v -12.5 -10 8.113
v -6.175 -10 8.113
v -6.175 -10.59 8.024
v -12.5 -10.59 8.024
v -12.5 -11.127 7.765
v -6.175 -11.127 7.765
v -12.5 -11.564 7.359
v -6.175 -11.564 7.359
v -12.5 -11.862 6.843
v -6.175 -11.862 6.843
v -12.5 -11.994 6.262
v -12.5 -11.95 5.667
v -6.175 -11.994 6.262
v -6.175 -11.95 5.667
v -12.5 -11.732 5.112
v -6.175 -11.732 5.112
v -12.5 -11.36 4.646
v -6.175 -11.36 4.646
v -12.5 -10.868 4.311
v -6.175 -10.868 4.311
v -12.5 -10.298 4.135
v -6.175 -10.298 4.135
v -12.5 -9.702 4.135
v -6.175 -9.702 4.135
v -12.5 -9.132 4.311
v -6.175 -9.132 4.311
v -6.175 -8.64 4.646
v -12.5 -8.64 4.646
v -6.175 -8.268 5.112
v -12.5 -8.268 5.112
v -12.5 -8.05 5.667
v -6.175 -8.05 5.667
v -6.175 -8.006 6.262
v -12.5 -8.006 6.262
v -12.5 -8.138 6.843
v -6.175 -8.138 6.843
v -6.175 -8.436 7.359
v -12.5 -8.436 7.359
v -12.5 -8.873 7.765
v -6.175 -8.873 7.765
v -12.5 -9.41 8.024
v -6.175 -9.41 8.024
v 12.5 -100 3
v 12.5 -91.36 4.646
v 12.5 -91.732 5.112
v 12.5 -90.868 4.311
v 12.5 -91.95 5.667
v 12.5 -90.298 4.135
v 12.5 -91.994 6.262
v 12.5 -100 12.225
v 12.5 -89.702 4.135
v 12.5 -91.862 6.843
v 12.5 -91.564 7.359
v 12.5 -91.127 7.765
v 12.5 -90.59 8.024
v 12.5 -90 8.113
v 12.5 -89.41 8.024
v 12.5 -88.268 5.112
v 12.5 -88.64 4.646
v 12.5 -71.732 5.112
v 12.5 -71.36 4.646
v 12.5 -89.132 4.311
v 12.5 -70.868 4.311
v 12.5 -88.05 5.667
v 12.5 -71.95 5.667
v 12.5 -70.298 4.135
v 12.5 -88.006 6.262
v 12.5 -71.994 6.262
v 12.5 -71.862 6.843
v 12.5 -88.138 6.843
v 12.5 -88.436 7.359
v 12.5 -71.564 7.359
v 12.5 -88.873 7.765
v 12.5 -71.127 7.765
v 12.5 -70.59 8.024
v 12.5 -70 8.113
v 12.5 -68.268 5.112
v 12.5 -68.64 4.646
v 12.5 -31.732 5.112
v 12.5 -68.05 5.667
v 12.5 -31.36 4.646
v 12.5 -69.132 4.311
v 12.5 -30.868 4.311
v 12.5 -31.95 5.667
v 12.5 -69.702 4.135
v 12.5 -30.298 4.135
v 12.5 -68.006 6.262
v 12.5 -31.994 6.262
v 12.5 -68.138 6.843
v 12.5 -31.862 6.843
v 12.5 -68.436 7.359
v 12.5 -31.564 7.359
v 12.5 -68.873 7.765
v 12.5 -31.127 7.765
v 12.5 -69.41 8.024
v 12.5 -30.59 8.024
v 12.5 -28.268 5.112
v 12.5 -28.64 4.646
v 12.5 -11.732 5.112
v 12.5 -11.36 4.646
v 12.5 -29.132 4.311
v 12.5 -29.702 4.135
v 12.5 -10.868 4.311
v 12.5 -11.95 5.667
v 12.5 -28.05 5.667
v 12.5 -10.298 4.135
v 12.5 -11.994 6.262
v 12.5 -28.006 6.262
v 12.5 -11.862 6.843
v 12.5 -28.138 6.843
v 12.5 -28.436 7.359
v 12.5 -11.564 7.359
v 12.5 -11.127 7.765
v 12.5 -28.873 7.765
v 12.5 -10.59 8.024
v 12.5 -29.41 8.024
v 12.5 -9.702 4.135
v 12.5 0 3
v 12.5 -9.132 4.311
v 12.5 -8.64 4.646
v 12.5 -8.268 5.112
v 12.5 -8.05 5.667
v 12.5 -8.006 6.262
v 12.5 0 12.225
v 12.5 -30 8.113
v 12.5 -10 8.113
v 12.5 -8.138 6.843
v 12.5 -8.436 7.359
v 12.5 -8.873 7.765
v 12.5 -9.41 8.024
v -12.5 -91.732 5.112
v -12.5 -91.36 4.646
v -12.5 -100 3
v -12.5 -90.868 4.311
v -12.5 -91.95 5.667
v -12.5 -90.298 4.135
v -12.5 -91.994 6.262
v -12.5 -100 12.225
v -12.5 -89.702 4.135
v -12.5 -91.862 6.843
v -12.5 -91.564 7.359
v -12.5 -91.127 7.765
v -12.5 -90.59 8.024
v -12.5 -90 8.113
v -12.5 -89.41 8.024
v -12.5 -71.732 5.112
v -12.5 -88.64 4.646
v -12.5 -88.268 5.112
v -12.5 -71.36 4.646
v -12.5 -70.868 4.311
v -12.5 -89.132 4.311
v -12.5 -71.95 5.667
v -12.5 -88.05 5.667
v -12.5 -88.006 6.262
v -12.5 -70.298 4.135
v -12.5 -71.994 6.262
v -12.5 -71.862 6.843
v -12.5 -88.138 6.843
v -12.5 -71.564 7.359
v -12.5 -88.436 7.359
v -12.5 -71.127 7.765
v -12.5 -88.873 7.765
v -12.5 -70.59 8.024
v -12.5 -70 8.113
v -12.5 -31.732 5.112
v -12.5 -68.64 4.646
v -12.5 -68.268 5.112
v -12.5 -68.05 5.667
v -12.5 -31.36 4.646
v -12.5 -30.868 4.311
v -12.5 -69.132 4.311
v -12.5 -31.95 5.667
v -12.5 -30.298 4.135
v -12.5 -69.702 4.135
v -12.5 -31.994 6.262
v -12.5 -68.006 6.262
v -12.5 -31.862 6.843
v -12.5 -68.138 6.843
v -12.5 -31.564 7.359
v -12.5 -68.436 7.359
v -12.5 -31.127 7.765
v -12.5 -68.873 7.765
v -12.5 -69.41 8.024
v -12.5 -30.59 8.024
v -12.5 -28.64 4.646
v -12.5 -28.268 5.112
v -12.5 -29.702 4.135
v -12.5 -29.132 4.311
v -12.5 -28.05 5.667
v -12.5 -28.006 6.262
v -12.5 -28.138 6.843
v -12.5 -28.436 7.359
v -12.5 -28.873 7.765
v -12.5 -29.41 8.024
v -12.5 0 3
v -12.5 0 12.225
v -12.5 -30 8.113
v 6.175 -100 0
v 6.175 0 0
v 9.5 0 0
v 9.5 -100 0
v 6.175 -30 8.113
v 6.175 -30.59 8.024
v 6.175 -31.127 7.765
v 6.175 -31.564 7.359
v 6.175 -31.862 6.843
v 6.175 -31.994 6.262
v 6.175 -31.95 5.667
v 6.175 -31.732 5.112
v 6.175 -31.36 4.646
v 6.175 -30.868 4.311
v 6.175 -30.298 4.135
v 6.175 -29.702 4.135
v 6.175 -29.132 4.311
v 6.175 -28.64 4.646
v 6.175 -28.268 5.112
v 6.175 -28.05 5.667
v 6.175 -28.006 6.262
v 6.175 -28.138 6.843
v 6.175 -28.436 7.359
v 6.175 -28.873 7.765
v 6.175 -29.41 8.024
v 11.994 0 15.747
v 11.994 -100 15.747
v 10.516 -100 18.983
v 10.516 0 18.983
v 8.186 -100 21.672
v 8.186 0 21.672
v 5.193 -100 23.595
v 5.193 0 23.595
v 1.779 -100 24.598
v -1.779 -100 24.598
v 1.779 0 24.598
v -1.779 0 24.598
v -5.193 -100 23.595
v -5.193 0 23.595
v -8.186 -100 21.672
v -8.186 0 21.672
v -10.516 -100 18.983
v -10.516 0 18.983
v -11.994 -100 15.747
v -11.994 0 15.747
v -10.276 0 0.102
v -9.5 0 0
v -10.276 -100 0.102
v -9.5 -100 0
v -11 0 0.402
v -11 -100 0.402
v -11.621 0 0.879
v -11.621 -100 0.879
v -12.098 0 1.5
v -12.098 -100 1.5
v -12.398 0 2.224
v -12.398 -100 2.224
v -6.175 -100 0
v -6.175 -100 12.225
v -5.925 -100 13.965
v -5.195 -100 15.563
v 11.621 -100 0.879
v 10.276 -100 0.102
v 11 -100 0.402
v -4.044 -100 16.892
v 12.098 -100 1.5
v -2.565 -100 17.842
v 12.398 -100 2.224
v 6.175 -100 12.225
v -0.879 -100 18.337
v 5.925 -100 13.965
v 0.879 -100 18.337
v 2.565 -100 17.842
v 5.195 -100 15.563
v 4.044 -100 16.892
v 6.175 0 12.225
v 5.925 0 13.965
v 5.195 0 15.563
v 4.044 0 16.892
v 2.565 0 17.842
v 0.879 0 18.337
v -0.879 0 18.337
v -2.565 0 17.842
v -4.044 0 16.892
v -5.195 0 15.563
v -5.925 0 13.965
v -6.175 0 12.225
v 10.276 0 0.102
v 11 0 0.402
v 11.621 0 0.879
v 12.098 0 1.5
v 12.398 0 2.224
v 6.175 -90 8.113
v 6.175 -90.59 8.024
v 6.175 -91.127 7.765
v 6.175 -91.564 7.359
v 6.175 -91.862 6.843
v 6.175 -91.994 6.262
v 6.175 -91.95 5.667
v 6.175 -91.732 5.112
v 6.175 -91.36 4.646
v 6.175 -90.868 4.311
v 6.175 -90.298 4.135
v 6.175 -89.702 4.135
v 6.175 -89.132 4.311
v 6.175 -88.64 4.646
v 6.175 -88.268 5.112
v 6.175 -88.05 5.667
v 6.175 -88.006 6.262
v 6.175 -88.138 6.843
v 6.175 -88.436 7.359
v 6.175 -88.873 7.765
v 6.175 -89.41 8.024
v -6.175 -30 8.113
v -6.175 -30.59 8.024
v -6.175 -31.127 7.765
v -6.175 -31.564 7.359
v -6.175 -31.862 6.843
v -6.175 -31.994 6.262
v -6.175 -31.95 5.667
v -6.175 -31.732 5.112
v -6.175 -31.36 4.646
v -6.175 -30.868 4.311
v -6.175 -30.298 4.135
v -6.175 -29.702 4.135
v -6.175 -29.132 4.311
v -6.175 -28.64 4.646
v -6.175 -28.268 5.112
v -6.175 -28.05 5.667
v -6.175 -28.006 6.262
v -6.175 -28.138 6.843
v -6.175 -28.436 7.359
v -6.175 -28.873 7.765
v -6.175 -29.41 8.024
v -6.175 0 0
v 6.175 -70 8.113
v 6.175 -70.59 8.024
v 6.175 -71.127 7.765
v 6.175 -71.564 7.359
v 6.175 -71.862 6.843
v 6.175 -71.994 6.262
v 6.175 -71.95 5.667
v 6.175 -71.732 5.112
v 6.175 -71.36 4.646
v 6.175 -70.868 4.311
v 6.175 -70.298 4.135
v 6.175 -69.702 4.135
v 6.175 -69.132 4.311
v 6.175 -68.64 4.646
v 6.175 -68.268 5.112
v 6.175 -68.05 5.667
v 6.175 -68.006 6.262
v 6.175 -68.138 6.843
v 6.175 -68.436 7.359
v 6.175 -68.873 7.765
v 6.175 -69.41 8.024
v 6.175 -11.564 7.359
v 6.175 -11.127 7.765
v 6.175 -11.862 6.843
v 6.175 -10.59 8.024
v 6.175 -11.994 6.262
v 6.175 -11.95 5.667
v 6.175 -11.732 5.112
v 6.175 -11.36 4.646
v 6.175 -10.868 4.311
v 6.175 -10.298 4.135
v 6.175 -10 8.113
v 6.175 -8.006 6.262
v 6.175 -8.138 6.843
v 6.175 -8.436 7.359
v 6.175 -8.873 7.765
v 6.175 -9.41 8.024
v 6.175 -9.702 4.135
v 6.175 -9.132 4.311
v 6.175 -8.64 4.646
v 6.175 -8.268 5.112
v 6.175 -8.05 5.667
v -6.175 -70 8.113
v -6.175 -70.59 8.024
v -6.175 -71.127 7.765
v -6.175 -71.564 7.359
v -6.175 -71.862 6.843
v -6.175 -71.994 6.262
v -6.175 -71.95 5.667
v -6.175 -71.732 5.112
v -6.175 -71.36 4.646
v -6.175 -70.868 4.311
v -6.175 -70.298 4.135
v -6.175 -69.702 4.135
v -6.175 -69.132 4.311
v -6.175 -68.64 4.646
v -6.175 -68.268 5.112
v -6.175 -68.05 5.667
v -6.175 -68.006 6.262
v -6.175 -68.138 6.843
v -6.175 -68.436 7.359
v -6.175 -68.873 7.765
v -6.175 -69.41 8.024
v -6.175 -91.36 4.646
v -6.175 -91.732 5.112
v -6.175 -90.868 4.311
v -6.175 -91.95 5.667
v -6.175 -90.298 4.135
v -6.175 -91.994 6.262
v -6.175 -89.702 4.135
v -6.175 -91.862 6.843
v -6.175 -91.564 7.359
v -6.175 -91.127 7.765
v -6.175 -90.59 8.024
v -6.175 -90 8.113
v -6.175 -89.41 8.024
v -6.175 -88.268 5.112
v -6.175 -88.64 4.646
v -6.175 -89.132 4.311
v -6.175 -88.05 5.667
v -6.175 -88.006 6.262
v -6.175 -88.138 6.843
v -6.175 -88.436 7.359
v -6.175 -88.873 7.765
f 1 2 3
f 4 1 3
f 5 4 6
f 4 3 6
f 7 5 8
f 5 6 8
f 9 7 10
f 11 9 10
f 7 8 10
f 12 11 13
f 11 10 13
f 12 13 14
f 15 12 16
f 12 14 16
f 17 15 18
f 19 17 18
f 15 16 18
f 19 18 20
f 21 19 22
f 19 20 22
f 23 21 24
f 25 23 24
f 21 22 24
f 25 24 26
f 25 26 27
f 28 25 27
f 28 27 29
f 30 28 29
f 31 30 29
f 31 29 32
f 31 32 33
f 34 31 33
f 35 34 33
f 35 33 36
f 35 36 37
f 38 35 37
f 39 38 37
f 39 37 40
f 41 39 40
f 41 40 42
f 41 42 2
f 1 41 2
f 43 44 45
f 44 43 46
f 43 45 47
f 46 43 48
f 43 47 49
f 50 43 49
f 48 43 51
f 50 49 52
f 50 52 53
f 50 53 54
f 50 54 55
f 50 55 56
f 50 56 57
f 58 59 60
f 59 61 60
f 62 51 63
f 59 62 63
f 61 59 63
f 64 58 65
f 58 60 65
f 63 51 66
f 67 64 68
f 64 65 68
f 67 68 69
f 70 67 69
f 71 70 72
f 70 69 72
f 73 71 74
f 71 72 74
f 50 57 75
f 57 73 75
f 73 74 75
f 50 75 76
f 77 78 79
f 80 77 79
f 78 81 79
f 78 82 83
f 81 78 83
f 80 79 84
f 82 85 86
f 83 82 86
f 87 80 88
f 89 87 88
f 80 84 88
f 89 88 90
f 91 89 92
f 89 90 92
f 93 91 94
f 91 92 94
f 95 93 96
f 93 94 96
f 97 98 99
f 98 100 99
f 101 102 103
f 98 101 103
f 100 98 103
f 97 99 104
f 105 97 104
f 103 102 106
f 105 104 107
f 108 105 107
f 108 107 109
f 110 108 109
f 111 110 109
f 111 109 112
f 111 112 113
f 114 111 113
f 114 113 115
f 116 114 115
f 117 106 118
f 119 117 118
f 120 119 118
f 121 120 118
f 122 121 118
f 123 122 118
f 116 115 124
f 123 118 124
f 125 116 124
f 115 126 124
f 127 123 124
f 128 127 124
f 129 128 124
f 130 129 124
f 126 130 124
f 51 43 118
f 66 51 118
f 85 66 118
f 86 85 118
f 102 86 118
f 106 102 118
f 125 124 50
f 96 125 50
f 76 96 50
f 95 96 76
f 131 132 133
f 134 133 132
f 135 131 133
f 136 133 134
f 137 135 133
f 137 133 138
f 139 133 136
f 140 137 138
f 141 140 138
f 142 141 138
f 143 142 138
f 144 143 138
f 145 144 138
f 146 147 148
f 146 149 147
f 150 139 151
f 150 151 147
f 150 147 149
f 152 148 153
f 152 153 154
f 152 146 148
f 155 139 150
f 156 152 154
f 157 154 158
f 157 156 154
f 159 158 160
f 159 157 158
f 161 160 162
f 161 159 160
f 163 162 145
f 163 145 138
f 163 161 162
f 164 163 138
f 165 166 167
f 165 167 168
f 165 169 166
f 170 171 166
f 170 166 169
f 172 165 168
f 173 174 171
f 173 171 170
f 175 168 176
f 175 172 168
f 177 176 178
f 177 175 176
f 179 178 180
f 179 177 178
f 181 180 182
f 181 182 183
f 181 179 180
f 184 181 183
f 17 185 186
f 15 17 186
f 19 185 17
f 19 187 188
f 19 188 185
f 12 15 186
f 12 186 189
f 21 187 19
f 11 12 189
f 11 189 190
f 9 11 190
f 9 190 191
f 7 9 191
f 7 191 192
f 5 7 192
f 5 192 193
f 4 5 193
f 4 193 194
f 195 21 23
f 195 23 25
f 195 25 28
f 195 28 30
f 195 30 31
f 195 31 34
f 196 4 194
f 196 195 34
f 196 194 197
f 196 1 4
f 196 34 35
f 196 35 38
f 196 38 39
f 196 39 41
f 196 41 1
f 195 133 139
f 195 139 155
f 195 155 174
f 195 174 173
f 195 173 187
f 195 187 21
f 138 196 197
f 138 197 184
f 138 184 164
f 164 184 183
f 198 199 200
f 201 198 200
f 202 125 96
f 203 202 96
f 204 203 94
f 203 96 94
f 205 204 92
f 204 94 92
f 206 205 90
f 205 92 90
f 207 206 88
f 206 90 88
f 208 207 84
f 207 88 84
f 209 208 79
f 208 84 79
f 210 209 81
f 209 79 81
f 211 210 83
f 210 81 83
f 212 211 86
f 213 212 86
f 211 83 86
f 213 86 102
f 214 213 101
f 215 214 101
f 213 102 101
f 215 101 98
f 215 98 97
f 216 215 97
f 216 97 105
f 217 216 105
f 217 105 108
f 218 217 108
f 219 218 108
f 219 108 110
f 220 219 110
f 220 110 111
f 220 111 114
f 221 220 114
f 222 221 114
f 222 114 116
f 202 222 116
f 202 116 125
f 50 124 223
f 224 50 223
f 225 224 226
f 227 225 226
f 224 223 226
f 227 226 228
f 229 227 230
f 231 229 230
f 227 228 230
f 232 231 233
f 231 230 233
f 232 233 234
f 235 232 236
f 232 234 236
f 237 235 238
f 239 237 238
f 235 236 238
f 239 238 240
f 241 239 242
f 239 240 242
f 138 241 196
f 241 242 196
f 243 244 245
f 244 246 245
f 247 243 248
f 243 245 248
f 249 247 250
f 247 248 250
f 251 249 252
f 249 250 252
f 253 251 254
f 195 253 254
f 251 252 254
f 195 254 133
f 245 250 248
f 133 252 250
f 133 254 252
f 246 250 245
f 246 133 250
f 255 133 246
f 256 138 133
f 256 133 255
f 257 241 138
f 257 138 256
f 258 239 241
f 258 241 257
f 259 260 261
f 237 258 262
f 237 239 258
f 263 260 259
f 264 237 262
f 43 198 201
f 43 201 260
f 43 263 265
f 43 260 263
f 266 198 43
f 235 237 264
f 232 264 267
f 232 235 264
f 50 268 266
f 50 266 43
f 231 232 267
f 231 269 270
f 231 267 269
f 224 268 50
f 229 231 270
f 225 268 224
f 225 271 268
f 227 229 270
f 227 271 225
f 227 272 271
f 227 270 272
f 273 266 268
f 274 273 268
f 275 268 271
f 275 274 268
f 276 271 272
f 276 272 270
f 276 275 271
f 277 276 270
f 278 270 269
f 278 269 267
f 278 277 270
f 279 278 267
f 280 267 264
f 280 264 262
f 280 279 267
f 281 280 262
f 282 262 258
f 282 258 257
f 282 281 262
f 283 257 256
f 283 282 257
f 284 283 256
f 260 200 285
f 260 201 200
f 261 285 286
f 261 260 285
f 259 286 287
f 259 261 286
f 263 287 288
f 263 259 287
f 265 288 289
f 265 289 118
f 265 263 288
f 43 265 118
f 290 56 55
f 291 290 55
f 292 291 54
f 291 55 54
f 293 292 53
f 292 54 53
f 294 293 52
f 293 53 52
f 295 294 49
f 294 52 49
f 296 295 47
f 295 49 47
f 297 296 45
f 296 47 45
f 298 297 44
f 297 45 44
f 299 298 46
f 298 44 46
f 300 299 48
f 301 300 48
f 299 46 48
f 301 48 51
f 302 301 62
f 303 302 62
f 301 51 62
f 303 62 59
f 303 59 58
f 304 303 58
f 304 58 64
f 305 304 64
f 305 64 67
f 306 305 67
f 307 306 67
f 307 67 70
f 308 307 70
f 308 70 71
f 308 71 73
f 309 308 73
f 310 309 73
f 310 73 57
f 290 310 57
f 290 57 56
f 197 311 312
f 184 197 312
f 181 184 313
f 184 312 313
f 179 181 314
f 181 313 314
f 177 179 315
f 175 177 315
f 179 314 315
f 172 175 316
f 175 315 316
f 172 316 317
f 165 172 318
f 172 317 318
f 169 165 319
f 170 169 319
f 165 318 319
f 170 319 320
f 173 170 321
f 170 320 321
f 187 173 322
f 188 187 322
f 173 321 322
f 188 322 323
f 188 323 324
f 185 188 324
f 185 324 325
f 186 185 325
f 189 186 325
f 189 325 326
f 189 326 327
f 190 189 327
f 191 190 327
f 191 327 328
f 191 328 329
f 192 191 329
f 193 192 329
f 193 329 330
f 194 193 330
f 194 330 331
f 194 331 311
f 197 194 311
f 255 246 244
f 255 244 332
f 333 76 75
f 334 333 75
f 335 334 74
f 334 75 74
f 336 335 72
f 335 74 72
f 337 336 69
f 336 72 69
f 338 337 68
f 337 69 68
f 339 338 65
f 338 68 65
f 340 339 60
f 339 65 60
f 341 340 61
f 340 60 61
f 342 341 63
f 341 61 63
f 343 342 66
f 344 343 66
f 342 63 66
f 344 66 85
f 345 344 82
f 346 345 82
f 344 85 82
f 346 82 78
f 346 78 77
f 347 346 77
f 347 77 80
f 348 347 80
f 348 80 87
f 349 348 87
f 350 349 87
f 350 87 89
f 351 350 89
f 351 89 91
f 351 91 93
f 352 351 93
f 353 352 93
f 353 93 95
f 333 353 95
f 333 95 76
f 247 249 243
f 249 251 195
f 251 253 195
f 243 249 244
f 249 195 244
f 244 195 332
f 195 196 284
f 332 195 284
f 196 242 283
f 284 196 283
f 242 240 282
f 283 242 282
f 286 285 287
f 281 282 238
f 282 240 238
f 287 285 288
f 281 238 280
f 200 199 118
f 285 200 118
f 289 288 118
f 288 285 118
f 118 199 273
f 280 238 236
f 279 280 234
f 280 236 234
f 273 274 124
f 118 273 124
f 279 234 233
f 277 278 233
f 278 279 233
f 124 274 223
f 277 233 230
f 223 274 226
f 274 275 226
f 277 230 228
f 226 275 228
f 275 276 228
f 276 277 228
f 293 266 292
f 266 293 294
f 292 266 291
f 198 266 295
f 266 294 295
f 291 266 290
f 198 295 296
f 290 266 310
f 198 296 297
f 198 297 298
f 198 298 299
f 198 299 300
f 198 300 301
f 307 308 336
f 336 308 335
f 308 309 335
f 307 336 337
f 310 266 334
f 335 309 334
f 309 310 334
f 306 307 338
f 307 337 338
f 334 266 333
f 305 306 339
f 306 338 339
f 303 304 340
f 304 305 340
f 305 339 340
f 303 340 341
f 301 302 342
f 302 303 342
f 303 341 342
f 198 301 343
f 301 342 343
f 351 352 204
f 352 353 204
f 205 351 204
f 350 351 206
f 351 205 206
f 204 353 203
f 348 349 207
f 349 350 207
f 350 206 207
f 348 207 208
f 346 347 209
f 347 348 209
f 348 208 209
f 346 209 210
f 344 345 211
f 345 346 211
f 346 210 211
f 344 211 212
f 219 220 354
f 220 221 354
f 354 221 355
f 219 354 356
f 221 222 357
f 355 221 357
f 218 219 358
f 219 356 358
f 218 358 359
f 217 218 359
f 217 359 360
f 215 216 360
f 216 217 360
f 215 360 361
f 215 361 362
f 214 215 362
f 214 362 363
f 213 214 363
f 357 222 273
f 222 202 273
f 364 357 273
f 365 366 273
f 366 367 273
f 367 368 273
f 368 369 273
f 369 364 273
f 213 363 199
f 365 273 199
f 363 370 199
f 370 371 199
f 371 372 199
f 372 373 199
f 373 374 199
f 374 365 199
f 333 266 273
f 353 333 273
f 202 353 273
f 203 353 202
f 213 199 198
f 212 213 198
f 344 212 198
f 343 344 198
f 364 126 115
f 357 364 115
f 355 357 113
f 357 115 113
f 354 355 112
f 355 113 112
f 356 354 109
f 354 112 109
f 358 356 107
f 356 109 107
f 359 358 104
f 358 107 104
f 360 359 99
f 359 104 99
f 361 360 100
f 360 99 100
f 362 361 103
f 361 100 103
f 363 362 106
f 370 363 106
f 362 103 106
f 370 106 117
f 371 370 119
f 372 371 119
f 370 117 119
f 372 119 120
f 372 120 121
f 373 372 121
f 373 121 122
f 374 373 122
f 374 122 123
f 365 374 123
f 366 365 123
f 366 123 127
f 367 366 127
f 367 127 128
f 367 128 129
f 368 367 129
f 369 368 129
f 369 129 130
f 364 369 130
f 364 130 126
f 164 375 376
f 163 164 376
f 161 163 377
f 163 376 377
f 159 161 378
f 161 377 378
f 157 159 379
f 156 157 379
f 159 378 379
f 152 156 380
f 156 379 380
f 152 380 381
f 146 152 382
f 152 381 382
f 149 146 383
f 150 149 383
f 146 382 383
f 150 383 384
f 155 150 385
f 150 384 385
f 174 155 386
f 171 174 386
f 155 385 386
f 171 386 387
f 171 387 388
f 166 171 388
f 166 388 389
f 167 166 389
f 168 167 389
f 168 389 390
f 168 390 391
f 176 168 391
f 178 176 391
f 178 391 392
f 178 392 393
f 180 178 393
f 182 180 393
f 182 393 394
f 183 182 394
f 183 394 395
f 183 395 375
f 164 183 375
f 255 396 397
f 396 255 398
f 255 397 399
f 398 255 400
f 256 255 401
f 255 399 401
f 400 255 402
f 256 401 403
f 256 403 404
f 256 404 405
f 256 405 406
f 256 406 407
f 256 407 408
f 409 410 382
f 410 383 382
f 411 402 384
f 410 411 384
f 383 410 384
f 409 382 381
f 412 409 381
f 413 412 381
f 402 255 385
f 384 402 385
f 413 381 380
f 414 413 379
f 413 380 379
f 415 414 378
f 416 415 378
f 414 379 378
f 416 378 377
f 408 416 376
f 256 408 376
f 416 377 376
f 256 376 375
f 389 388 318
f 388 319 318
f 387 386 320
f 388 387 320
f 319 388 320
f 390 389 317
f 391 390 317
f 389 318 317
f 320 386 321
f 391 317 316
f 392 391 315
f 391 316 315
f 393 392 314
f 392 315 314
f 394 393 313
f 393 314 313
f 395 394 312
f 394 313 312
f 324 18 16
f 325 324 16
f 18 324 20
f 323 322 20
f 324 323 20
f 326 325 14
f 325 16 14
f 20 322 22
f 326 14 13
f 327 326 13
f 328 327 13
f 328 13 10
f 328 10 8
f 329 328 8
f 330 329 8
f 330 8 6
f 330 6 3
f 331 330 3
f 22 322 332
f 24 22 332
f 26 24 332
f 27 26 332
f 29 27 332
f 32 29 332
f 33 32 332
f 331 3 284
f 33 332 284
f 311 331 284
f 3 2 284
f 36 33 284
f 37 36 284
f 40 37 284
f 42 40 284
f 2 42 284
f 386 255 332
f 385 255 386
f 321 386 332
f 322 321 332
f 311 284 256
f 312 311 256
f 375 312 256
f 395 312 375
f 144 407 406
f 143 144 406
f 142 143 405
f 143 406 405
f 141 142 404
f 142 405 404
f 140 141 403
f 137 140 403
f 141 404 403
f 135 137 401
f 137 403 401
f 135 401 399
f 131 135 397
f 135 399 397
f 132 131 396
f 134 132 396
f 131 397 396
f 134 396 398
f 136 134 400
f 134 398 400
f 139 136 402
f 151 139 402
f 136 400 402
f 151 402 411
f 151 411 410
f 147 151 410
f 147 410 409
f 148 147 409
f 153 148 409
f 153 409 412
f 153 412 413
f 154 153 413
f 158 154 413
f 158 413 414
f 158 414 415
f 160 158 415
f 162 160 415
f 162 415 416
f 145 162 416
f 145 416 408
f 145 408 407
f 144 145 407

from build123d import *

# Parameters (mm, degrees)
PAD_DEPTH    = 100
SKETCH001_R  = 2
POCKET_DEPTH = 25.001
FILLET_R     = 3


with BuildPart() as part:
    # Sketch → Pad (new body)
    with BuildSketch(Plane.XZ):
        with BuildLine():
            Line((-6.175, 0), (-6.175, 12.225))
            ThreePointArc((6.175, 12.225), (0, 18.4), (-6.175, 12.225))
            Line((6.175, 12.225), (6.175, 0))
            Line((6.175, 0), (12.5, 0))
            Line((12.5, 0), (12.5, 12.225))
            ThreePointArc((12.5, 12.225), (0, 24.725), (-12.5, 12.225))
            Line((-12.5, 0), (-12.5, 12.225))
            Line((-12.5, 0), (-6.175, 0))
        make_face()
    extrude(amount=PAD_DEPTH)

    # Sketch001 (on Face6 of Pad) → Pocket (cut, through all)
    with BuildSketch(Plane(origin=(12.5, 0, 0), x_dir=(0, 0, 1), z_dir=(1, 0, 0))):
        with Locations((6.1125, 10)):
            Circle(SKETCH001_R)
        with Locations((6.1125, 90)):
            Circle(SKETCH001_R)
        with Locations((6.1125, 70)):
            Circle(SKETCH001_R)
        with Locations((6.1125, 30)):
            Circle(SKETCH001_R)
    extrude(amount=-POCKET_DEPTH, mode=Mode.SUBTRACT)

    # Fillet
    fillet_edges = [part.edges().sort_by_distance(p)[0] for p in [
        (12.5, -50, 0),
        (-12.5, -50, 0),
    ]]
    fillet(fillet_edges, radius=FILLET_R)


solid = part.part
